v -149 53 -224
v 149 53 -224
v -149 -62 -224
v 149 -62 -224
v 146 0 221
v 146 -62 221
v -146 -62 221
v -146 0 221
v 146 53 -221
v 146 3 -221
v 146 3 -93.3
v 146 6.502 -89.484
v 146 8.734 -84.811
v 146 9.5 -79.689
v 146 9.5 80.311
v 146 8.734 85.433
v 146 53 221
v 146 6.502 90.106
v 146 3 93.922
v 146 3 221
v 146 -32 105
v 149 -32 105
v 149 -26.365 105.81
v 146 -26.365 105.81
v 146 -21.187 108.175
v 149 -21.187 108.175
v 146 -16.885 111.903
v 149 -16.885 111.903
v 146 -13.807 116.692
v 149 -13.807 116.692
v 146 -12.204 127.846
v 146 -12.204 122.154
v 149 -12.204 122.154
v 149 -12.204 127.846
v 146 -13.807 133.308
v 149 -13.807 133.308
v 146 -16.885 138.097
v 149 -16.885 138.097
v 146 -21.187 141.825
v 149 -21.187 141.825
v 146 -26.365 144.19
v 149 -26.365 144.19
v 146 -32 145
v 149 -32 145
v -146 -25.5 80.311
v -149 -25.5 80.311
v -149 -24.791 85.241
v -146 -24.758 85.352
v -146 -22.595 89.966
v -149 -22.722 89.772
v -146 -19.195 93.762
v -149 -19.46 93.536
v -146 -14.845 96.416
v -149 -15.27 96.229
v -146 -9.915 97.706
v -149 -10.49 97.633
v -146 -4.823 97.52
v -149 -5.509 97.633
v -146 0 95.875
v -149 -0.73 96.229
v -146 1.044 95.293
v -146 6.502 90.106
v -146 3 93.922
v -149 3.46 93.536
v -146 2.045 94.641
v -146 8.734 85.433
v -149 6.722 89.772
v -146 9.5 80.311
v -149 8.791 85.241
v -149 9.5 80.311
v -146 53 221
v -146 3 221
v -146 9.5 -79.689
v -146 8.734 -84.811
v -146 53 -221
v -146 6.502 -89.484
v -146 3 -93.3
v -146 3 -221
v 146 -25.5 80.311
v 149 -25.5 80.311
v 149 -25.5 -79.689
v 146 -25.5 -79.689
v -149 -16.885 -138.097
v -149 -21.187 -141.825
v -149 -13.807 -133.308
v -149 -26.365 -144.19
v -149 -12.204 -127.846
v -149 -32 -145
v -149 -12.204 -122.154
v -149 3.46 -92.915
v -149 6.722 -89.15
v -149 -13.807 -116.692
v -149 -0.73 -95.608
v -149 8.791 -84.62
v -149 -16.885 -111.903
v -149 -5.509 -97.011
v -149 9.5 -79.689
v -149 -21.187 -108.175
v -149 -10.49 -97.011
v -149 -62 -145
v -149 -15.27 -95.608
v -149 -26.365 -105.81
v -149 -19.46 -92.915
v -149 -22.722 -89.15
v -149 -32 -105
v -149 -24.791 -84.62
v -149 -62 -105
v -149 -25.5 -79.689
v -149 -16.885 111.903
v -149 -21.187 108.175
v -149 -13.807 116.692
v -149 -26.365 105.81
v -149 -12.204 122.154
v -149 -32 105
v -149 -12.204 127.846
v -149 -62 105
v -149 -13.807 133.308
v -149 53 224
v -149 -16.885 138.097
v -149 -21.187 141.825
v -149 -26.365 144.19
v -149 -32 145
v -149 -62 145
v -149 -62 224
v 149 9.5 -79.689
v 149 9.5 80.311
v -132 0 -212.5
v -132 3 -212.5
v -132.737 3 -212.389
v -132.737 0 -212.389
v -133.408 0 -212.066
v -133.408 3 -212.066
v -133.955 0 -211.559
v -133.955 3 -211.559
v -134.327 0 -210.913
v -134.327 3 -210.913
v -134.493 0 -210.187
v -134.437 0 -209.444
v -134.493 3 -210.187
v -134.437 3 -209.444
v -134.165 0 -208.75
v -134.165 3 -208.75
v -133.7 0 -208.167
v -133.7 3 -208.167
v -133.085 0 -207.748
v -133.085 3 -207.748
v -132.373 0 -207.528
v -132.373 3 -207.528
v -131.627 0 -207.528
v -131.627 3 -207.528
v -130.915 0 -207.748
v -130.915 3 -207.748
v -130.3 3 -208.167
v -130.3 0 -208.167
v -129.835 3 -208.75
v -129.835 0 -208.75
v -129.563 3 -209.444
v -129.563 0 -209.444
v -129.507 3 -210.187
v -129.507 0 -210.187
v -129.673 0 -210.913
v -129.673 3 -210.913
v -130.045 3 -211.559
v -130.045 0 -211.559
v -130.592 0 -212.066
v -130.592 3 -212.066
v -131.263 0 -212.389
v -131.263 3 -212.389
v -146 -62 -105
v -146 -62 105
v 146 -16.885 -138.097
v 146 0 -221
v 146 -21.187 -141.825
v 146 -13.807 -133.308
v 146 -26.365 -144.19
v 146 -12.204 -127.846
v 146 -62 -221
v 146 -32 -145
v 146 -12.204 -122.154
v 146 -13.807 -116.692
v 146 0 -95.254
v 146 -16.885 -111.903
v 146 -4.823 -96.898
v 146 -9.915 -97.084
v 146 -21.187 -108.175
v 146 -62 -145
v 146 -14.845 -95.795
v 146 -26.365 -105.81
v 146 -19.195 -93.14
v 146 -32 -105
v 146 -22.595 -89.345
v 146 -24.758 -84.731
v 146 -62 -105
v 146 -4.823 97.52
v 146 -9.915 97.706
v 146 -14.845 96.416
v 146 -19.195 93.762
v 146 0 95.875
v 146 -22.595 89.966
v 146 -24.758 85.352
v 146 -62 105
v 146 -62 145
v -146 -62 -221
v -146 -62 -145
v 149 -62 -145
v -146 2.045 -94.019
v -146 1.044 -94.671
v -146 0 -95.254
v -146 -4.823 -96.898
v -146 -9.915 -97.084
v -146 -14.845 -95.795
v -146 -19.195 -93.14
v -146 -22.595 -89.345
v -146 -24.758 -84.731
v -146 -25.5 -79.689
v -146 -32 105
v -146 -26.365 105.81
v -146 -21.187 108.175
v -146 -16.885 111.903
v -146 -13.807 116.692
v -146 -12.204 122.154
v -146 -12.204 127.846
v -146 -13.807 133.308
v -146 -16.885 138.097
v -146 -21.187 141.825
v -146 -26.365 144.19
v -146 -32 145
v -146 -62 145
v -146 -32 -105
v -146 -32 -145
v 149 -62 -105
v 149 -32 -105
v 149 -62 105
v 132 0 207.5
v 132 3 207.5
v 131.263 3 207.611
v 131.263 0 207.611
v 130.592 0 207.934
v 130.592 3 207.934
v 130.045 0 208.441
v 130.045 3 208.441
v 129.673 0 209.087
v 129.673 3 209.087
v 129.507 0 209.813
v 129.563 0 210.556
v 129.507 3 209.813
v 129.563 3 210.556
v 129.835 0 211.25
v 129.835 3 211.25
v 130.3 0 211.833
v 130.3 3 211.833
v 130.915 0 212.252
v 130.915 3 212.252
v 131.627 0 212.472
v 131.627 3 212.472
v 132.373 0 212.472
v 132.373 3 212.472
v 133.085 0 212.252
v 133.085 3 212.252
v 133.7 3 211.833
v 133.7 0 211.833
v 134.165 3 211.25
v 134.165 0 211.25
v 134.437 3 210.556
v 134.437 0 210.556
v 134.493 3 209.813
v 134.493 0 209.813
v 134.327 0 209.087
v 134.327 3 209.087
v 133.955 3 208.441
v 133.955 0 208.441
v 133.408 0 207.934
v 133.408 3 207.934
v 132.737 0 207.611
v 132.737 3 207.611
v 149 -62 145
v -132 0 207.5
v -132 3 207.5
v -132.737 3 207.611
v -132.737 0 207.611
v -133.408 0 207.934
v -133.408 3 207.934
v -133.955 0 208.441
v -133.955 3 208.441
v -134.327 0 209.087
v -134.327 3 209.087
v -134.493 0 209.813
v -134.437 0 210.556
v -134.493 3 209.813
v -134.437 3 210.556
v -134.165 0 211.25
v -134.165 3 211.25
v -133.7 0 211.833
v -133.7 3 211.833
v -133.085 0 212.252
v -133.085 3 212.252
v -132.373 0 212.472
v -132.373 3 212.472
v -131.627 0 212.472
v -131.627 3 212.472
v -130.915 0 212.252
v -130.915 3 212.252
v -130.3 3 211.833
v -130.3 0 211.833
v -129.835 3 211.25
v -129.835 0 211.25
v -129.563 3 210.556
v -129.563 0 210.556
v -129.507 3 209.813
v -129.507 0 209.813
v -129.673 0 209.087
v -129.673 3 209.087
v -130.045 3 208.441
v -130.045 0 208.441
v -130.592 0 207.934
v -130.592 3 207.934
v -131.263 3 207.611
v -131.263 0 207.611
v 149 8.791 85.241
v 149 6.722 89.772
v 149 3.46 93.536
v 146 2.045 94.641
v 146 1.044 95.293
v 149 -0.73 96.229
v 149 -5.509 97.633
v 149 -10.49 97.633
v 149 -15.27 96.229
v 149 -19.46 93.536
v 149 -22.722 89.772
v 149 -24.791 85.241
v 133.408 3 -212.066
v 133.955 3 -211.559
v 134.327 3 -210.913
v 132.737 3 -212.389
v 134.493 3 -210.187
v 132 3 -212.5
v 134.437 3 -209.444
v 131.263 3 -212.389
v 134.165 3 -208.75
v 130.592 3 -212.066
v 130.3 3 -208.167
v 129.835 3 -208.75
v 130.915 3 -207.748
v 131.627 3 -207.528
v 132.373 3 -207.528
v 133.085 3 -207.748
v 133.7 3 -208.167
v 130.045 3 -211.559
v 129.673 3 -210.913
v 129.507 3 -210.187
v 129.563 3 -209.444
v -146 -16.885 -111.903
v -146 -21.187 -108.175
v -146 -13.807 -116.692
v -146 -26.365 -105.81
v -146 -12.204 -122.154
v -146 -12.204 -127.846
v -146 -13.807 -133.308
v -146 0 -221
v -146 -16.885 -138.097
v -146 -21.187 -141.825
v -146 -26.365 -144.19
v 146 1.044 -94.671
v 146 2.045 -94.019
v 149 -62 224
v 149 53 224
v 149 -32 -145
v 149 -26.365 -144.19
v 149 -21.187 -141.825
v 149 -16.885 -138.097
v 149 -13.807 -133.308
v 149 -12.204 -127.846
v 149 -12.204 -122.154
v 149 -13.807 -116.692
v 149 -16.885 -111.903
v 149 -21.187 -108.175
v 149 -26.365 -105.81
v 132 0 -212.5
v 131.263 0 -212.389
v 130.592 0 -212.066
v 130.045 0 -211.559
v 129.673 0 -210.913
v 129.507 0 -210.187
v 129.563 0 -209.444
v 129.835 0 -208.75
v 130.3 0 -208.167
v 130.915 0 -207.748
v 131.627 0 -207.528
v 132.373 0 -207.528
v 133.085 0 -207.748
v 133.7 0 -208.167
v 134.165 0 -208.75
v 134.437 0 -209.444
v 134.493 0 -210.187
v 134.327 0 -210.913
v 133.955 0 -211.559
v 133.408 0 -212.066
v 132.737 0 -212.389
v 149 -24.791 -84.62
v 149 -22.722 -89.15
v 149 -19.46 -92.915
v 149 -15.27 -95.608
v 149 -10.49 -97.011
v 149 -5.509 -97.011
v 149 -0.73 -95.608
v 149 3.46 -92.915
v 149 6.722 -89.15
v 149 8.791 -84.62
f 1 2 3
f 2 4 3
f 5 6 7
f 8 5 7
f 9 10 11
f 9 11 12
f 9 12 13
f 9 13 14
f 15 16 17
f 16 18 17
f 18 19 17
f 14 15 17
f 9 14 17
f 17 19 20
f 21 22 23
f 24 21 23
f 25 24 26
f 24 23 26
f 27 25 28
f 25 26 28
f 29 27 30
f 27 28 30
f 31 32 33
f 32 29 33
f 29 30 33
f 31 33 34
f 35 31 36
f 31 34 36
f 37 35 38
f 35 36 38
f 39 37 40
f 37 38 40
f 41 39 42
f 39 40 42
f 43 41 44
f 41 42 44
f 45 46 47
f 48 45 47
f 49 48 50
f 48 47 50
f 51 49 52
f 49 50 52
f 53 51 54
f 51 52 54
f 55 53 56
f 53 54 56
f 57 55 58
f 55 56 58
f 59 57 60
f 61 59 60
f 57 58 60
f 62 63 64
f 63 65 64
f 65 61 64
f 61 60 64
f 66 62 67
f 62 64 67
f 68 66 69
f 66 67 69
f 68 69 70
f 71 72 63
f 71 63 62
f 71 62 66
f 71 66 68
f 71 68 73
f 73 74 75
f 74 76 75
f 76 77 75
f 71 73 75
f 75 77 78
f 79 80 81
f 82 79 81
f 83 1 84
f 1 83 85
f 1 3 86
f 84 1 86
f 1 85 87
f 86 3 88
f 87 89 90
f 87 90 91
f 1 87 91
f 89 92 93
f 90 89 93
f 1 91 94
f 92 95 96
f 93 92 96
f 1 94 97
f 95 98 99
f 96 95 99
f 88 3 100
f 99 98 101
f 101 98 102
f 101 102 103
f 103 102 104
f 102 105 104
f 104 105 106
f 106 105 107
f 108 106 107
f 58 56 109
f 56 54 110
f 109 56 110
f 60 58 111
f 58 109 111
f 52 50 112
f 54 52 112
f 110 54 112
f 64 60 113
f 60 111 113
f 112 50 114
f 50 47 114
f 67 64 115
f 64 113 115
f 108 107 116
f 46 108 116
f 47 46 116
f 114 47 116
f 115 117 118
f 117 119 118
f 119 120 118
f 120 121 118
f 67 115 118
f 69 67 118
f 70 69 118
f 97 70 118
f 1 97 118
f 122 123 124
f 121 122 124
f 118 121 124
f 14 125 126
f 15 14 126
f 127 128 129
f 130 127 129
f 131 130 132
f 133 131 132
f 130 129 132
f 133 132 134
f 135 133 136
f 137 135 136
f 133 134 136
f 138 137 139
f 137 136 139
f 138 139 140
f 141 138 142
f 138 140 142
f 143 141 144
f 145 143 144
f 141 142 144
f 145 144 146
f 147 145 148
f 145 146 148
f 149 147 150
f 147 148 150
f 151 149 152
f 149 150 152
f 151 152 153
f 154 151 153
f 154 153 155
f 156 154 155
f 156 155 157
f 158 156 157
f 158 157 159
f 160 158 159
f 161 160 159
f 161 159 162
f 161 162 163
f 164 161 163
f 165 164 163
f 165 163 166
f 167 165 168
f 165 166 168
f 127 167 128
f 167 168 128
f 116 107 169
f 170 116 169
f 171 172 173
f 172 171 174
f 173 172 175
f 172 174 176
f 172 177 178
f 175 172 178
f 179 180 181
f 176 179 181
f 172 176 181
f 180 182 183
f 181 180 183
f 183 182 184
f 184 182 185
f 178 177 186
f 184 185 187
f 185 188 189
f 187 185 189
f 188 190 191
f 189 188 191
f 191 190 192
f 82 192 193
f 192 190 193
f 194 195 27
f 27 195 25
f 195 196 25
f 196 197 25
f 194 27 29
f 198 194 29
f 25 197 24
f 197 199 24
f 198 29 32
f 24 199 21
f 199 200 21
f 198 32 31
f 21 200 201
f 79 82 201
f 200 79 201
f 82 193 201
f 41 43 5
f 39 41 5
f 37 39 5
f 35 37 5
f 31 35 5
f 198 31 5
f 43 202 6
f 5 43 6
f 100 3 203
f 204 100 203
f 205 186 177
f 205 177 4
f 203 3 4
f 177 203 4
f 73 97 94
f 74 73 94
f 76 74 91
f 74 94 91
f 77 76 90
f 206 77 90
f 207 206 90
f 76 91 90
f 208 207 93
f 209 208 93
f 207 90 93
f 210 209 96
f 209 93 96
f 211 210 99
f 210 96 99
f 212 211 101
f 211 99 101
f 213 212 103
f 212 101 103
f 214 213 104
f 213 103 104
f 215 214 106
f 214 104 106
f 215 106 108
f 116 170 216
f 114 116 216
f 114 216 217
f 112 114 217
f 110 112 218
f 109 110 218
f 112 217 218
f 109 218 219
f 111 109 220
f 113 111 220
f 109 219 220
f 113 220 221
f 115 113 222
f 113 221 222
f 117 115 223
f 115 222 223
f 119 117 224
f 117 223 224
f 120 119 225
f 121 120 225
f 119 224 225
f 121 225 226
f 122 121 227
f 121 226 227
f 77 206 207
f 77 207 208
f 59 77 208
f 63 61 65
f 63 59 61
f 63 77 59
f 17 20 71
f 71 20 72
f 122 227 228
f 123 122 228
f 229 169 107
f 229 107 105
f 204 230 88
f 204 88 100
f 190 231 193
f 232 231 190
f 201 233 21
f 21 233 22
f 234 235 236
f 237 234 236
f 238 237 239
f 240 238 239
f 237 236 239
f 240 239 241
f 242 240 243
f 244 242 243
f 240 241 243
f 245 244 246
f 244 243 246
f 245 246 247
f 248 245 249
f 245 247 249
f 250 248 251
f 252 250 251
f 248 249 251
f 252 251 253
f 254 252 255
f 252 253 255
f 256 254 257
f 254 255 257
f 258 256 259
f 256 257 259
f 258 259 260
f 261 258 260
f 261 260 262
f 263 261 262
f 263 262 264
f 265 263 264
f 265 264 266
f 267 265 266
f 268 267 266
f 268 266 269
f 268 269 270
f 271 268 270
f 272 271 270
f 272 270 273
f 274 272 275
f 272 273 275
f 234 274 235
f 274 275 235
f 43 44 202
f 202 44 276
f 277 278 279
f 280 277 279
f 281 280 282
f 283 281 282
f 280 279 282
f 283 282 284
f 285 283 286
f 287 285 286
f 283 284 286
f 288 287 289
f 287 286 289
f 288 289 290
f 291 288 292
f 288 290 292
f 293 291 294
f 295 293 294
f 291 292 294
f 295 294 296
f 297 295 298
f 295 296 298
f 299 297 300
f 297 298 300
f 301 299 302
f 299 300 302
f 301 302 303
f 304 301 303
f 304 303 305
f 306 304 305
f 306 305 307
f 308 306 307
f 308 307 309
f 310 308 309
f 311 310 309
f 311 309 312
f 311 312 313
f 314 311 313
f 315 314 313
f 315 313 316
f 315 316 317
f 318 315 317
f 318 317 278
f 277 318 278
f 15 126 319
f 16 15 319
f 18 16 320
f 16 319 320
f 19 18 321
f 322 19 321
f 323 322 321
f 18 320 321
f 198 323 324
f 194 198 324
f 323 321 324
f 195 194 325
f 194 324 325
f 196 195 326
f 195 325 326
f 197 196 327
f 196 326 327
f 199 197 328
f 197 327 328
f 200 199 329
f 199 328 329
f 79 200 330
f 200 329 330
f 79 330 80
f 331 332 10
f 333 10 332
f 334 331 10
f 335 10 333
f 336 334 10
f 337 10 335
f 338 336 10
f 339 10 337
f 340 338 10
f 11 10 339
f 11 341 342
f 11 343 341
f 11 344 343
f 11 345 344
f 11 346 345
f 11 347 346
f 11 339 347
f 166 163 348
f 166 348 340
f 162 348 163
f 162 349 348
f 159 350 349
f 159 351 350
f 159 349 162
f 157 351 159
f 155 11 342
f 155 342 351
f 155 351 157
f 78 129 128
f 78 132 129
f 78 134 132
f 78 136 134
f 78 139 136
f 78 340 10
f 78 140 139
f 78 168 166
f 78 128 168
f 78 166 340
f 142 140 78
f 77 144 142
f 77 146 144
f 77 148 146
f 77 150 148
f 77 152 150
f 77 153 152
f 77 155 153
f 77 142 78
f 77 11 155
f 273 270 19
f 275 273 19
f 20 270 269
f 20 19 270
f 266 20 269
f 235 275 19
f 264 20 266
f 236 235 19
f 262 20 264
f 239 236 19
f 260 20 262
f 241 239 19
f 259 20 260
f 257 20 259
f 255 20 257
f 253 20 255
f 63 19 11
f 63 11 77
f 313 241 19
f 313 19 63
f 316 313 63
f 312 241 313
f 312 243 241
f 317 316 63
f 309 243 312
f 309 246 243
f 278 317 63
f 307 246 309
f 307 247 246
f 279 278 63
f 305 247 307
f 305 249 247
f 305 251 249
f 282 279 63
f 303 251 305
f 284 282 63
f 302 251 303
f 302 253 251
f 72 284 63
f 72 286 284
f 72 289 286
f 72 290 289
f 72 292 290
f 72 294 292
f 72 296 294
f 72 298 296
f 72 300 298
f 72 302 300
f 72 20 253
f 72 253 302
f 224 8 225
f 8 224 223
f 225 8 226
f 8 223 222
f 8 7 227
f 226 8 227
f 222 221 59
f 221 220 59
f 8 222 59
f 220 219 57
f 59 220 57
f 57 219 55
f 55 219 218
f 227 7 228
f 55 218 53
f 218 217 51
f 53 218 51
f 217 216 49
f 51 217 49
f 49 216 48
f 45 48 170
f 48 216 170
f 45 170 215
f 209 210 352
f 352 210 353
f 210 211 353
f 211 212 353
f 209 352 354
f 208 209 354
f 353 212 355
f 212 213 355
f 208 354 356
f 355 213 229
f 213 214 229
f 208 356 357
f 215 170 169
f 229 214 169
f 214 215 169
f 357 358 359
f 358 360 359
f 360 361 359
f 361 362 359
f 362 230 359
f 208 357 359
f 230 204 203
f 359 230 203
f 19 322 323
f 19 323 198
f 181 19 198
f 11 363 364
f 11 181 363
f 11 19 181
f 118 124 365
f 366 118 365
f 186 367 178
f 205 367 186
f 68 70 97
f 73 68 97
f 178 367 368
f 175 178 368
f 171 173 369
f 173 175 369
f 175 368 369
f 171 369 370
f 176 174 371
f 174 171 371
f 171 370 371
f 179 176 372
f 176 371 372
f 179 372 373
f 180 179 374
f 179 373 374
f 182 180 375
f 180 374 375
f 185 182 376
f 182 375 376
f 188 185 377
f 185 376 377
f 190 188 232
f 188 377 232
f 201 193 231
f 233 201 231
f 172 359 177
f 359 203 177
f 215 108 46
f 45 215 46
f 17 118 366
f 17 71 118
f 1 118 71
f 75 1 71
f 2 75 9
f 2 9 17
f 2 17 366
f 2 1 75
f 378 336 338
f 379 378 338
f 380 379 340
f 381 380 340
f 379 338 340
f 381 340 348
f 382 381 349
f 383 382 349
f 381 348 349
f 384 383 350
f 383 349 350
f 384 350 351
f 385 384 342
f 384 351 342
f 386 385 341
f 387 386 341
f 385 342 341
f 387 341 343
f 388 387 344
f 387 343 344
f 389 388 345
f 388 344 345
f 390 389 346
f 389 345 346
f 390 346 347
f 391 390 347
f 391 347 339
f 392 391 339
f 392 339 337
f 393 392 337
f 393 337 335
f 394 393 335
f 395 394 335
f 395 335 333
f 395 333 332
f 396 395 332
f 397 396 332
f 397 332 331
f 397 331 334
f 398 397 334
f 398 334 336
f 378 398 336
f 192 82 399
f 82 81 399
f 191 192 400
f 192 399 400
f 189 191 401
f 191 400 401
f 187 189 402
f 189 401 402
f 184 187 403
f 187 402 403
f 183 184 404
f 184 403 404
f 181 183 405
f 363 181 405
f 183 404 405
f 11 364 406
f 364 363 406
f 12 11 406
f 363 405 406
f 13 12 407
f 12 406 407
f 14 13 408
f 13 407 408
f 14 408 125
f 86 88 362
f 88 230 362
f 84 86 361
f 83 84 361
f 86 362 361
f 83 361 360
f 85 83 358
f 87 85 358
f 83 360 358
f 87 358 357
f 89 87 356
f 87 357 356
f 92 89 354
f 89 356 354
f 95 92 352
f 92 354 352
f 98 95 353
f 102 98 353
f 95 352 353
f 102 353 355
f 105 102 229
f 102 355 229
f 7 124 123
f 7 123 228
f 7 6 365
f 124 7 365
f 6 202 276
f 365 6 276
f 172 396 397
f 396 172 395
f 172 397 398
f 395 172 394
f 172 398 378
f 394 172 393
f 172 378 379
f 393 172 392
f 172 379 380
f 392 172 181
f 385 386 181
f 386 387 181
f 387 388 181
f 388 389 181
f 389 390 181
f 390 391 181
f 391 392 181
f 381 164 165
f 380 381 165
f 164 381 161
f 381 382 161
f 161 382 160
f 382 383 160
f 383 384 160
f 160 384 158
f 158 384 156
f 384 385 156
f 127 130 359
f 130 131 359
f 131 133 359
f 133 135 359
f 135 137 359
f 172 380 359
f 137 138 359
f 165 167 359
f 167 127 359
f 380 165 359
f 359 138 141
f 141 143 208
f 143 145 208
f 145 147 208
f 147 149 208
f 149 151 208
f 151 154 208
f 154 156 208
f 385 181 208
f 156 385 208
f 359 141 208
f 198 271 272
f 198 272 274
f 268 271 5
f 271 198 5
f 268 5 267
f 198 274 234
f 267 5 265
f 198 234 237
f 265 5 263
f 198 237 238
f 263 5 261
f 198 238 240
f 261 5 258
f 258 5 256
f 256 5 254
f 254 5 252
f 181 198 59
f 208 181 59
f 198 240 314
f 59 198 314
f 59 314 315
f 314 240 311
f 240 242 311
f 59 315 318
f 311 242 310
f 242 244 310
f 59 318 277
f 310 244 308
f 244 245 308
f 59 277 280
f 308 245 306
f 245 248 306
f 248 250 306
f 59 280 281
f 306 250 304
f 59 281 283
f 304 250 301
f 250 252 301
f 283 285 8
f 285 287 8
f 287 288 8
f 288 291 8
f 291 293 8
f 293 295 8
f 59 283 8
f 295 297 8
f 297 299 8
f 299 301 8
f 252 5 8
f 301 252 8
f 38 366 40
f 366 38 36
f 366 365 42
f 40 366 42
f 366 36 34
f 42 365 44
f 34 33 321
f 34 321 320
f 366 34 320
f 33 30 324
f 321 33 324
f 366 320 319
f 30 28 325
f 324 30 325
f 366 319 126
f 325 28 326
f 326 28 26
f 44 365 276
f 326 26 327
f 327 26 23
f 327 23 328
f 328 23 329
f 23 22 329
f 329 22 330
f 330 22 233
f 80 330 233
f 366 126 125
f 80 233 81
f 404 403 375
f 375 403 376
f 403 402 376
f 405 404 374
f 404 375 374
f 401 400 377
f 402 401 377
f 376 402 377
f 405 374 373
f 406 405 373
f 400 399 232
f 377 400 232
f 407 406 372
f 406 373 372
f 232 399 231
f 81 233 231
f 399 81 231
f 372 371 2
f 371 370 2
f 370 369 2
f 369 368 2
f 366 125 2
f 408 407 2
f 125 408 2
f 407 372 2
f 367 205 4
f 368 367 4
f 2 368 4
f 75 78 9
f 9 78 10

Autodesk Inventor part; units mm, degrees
ref_plane "YZ Plane" through (0, 0, 0) normal (1, 0, 0) x (0, 1, 0)
ref_plane "XZ Plane" through (0, 0, 0) normal (0, 1, 0) x (-1, 0, 0)
ref_plane "XY Plane" through (0, 0, 0) normal (0, 0, 1) x (1, 0, 0)
sketch "Sketch1" plane through (0, 0, 0) normal (0, 1, 0) x (-1, 0, 0)
  line L0 (-149, -224) -> (149, -224)
  line L1 (149, -224) -> (149, 224)
  line L2 (149, 224) -> (-149, 224)
  line L3 (-149, 224) -> (-149, -224)
  line L4 (-149, -224) -> (149, 224) construction
  line L5 (149, -224) -> (-149, 224) construction
  point P0 (0, 0)
  point P1 (132, 210)
  point P2 (-132, -210)
  point P3 (132, -210)
  point P4 (-132, 210)
  dimension "d0" = 298
  dimension "d1" = 448
extrude "Extrusion1" add sketch "Sketch1" along normal blind 3
sketch "Sketch2" plane through (0, 3, 0) normal (0, 1, 0) x (1, 0, 0)
  line L0 (-149, 224) -> (-149, -224) projected
  line L1 (-149, -224) -> (149, -224) projected
  line L2 (149, -224) -> (149, 224) projected
  line L3 (149, 224) -> (-149, 224) projected
  line L4 (-149, 224) -> (-149, -224) projected
  line L5 (-149, -224) -> (149, -224) projected
  line L6 (149, -224) -> (149, 224) projected
  line L7 (149, 224) -> (-149, 224) projected
  line L8 (-146, -221) -> (-146, 221)
  line L9 (-146, 221) -> (146, 221)
  line L10 (146, 221) -> (146, -221)
  line L11 (146, -221) -> (-146, -221)
  point P0 (0, 0)
  dimension "d4" = 3
extrude "Extrusion2" add sketch "Sketch2" along normal blind 50 and the other way blind 65
hole "Hole1" at (132, 0, -210) at (132, 0, 210) at (-132, 0, 210) at (-132, 0, -210) direction (0, 1, 0) diameter 5 end through all
sketch "Sketch3" plane through (149, -62, -224) normal (1, 0, 0) x (0, 0, -1)
  line L0 (0, 0) -> (0, 115) projected
  line L1 (-448, 115) -> (0, 115) projected
  line L2 (-448, 0) -> (-448, 115) projected
  line L3 (0, 0) -> (-448, 0) projected
  point P0 (-224, 62)
sketch "Sketch4" plane through (149, -62, -224) normal (1, 0, 0) x (0, 0, -1)
  line L0 (0, 0) -> (0, 115) projected
  line L1 (-448, 115) -> (0, 115) projected
  line L2 (-448, 0) -> (-448, 115) projected
  line L3 (0, 0) -> (-448, 0) projected
  point P0 (-224, 62)
sketch "Sketch5" plane through (149, -62, -224) normal (1, 0, 0) x (0, 0, -1)
  line L0 (0, 0) -> (0, 115) projected
  line L1 (-448, 115) -> (0, 115) projected
  line L2 (-448, 0) -> (-448, 115) projected
  line L3 (0, 0) -> (-448, 0) projected
  line L4 (0, 0) -> (-448, 0) projected
  point P0 (-224, 62)
  point P1 (-224, 62)
  point P2 (-99, 25)
  dimension "d16" = 99
  dimension "d17" = 25
sketch "Sketch6" plane through (149, -62, -224) normal (1, 0, 0) x (0, 0, -1)
  line L0 (0, 0) -> (-448, 0) projected
  line L1 (-445, 115) -> (-3, 115) projected
  line L2 (-224, 115) -> (-224, 0)
  line L3 (-79, 0) -> (-119, 0)
  line L4 (-119, 0) -> (-119, 30)
  line L5 (-99, 50) -> (-99, 50)
  line L6 (-79, 30) -> (-79, 0)
  line L7 (-79, 0) -> (-119, 50) construction
  line L8 (-119, 0) -> (-79, 50) construction
  line L9 (-448, 0) -> (-448, 115) projected
  arc A0 (-99, 50) -> (-119, 30) centre (-99, 30) ccw
  arc A1 (-79, 30) -> (-99, 50) centre (-99, 30) ccw
  line L10 (-329, 0) -> (-329, 30)
  line L11 (-369, 30) -> (-369, 0)
  line L12 (-369, 0) -> (-329, 50) construction
  line L13 (-329, 0) -> (-369, 50) construction
  arc A2 (-329, 30) -> (-349, 50) centre (-349, 30) ccw
  arc A3 (-349, 50) -> (-369, 30) centre (-349, 30) ccw
  line L14 (-304.3108, 54.0001) -> (-144.3108, 54.0001) construction
  line L15 (-445, 62) -> (-3, 62) projected
  line L16 (-304.3108, 36.5001) -> (-144.3108, 36.5001)
  line L17 (-144.3108, 71.5001) -> (-304.3108, 71.5001)
  arc A4 (-304.3108, 71.5001) -> (-304.3108, 36.5001) centre (-304.3108, 54.0001) ccw
  arc A5 (-144.3108, 36.5001) -> (-144.3108, 71.5001) centre (-144.3108, 54.0001) ccw
  point P0 (-224, 62)
  point P1 (-99, 25)
  point P2 (-99, 25)
  point P3 (-99, 25)
  point P4 (-119, 0)
  point P5 (-79, 0)
  point P6 (-349, 25)
  point P7 (-349, 25)
  point P8 (-99, 50)
  point P9 (-349, 50)
  point P10 (-329, 0)
  point P11 (-224.3108, 54.0001)
  point P12 (-304.3108, 54.0001)
  dimension "d18" = 40
  dimension "d19" = 50
  dimension "d26" = 20
  dimension "d27" = 20
  dimension "d28" = 99
  dimension "d29" = 25
  dimension "d32" = 35
extrude "Extrusion3" cut sketch "Sketch6" against normal through all contours L0 L4 A0 A1 L6
extrude "Extrusion4" cut sketch "Sketch6" against normal through all contours L0 L11 A3 A2 L10
extrude "Extrusion5" cut sketch "Sketch6" against normal blind 3 contours L16 A4 L15 L2 | L2 L15 A5 L16 | L15 A4 L17 L2 | L2 L17 A5 L15
sketch "Sketch7" plane through (149, -62, -224) normal (1, 0, 0) x (0, 0, -1)
  arc A0 (-144.3108, 36.5001) -> (-144.3108, 71.5001) centre (-144.3108, 54.0001) ccw projected
  line L0 (-144.3108, 36.5001) -> (-304.3108, 36.5001) projected
  arc A1 (-304.3108, 71.5001) -> (-304.3108, 36.5001) centre (-304.3108, 54.0001) ccw projected
  line L1 (-304.3108, 71.5001) -> (-144.3108, 71.5001) projected
  line L2 (-369, 0) -> (-369, 30) projected
  arc A2 (-329, 30) -> (-369, 30) centre (-349, 30) ccw projected
  line L3 (-329, 30) -> (-329, 0) projected
  line L4 (-119, 0) -> (-329, 0) projected
  line L5 (-119, 0) -> (-119, 30) projected
  arc A3 (-79, 30) -> (-119, 30) centre (-99, 30) ccw projected
  line L6 (-79, 30) -> (-79, 0) projected
  line L7 (0, 0) -> (-79, 0) projected
  line L8 (0, 0) -> (0, 115) projected
  line L9 (-448, 115) -> (0, 115) projected
  line L10 (-448, 0) -> (-448, 115) projected
  line L11 (-369, 0) -> (-448, 0) projected
  point P0 (-224, 62)
ref_plane "Work Plane2" through (0, -62, -224) normal (1, 0, 0) x (0, 0, -1)
sketch "Sketch8" plane through (149, -62, -224) normal (1, 0, 0) x (0, 0, -1)
  arc A0 (-144.3108, 36.5001) -> (-144.3108, 71.5001) centre (-144.3108, 54.0001) ccw projected
  line L0 (-144.3108, 36.5001) -> (-304.3108, 36.5001) projected
  arc A1 (-304.3108, 71.5001) -> (-304.3108, 36.5001) centre (-304.3108, 54.0001) ccw projected
  line L1 (-304.3108, 71.5001) -> (-144.3108, 71.5001) projected
  line L2 (-369, 0) -> (-369, 30) projected
  arc A2 (-329, 30) -> (-369, 30) centre (-349, 30) ccw projected
  line L3 (-329, 30) -> (-329, 0) projected
  line L4 (-119, 0) -> (-329, 0) projected
  line L5 (-119, 0) -> (-119, 30) projected
  arc A3 (-79, 30) -> (-119, 30) centre (-99, 30) ccw projected
  line L6 (-79, 30) -> (-79, 0) projected
  line L7 (0, 0) -> (-79, 0) projected
  line L8 (0, 0) -> (0, 115) projected
  line L9 (-448, 115) -> (0, 115) projected
  line L10 (-448, 0) -> (-448, 115) projected
  line L11 (-369, 0) -> (-448, 0) projected
  point P0 (-224, 62)
mirror "Mirror1" about plane through (0, -62, -224) normal (1, 0, 0) of "Extrusion5"
properties part number "AMR_Top_Basket"
